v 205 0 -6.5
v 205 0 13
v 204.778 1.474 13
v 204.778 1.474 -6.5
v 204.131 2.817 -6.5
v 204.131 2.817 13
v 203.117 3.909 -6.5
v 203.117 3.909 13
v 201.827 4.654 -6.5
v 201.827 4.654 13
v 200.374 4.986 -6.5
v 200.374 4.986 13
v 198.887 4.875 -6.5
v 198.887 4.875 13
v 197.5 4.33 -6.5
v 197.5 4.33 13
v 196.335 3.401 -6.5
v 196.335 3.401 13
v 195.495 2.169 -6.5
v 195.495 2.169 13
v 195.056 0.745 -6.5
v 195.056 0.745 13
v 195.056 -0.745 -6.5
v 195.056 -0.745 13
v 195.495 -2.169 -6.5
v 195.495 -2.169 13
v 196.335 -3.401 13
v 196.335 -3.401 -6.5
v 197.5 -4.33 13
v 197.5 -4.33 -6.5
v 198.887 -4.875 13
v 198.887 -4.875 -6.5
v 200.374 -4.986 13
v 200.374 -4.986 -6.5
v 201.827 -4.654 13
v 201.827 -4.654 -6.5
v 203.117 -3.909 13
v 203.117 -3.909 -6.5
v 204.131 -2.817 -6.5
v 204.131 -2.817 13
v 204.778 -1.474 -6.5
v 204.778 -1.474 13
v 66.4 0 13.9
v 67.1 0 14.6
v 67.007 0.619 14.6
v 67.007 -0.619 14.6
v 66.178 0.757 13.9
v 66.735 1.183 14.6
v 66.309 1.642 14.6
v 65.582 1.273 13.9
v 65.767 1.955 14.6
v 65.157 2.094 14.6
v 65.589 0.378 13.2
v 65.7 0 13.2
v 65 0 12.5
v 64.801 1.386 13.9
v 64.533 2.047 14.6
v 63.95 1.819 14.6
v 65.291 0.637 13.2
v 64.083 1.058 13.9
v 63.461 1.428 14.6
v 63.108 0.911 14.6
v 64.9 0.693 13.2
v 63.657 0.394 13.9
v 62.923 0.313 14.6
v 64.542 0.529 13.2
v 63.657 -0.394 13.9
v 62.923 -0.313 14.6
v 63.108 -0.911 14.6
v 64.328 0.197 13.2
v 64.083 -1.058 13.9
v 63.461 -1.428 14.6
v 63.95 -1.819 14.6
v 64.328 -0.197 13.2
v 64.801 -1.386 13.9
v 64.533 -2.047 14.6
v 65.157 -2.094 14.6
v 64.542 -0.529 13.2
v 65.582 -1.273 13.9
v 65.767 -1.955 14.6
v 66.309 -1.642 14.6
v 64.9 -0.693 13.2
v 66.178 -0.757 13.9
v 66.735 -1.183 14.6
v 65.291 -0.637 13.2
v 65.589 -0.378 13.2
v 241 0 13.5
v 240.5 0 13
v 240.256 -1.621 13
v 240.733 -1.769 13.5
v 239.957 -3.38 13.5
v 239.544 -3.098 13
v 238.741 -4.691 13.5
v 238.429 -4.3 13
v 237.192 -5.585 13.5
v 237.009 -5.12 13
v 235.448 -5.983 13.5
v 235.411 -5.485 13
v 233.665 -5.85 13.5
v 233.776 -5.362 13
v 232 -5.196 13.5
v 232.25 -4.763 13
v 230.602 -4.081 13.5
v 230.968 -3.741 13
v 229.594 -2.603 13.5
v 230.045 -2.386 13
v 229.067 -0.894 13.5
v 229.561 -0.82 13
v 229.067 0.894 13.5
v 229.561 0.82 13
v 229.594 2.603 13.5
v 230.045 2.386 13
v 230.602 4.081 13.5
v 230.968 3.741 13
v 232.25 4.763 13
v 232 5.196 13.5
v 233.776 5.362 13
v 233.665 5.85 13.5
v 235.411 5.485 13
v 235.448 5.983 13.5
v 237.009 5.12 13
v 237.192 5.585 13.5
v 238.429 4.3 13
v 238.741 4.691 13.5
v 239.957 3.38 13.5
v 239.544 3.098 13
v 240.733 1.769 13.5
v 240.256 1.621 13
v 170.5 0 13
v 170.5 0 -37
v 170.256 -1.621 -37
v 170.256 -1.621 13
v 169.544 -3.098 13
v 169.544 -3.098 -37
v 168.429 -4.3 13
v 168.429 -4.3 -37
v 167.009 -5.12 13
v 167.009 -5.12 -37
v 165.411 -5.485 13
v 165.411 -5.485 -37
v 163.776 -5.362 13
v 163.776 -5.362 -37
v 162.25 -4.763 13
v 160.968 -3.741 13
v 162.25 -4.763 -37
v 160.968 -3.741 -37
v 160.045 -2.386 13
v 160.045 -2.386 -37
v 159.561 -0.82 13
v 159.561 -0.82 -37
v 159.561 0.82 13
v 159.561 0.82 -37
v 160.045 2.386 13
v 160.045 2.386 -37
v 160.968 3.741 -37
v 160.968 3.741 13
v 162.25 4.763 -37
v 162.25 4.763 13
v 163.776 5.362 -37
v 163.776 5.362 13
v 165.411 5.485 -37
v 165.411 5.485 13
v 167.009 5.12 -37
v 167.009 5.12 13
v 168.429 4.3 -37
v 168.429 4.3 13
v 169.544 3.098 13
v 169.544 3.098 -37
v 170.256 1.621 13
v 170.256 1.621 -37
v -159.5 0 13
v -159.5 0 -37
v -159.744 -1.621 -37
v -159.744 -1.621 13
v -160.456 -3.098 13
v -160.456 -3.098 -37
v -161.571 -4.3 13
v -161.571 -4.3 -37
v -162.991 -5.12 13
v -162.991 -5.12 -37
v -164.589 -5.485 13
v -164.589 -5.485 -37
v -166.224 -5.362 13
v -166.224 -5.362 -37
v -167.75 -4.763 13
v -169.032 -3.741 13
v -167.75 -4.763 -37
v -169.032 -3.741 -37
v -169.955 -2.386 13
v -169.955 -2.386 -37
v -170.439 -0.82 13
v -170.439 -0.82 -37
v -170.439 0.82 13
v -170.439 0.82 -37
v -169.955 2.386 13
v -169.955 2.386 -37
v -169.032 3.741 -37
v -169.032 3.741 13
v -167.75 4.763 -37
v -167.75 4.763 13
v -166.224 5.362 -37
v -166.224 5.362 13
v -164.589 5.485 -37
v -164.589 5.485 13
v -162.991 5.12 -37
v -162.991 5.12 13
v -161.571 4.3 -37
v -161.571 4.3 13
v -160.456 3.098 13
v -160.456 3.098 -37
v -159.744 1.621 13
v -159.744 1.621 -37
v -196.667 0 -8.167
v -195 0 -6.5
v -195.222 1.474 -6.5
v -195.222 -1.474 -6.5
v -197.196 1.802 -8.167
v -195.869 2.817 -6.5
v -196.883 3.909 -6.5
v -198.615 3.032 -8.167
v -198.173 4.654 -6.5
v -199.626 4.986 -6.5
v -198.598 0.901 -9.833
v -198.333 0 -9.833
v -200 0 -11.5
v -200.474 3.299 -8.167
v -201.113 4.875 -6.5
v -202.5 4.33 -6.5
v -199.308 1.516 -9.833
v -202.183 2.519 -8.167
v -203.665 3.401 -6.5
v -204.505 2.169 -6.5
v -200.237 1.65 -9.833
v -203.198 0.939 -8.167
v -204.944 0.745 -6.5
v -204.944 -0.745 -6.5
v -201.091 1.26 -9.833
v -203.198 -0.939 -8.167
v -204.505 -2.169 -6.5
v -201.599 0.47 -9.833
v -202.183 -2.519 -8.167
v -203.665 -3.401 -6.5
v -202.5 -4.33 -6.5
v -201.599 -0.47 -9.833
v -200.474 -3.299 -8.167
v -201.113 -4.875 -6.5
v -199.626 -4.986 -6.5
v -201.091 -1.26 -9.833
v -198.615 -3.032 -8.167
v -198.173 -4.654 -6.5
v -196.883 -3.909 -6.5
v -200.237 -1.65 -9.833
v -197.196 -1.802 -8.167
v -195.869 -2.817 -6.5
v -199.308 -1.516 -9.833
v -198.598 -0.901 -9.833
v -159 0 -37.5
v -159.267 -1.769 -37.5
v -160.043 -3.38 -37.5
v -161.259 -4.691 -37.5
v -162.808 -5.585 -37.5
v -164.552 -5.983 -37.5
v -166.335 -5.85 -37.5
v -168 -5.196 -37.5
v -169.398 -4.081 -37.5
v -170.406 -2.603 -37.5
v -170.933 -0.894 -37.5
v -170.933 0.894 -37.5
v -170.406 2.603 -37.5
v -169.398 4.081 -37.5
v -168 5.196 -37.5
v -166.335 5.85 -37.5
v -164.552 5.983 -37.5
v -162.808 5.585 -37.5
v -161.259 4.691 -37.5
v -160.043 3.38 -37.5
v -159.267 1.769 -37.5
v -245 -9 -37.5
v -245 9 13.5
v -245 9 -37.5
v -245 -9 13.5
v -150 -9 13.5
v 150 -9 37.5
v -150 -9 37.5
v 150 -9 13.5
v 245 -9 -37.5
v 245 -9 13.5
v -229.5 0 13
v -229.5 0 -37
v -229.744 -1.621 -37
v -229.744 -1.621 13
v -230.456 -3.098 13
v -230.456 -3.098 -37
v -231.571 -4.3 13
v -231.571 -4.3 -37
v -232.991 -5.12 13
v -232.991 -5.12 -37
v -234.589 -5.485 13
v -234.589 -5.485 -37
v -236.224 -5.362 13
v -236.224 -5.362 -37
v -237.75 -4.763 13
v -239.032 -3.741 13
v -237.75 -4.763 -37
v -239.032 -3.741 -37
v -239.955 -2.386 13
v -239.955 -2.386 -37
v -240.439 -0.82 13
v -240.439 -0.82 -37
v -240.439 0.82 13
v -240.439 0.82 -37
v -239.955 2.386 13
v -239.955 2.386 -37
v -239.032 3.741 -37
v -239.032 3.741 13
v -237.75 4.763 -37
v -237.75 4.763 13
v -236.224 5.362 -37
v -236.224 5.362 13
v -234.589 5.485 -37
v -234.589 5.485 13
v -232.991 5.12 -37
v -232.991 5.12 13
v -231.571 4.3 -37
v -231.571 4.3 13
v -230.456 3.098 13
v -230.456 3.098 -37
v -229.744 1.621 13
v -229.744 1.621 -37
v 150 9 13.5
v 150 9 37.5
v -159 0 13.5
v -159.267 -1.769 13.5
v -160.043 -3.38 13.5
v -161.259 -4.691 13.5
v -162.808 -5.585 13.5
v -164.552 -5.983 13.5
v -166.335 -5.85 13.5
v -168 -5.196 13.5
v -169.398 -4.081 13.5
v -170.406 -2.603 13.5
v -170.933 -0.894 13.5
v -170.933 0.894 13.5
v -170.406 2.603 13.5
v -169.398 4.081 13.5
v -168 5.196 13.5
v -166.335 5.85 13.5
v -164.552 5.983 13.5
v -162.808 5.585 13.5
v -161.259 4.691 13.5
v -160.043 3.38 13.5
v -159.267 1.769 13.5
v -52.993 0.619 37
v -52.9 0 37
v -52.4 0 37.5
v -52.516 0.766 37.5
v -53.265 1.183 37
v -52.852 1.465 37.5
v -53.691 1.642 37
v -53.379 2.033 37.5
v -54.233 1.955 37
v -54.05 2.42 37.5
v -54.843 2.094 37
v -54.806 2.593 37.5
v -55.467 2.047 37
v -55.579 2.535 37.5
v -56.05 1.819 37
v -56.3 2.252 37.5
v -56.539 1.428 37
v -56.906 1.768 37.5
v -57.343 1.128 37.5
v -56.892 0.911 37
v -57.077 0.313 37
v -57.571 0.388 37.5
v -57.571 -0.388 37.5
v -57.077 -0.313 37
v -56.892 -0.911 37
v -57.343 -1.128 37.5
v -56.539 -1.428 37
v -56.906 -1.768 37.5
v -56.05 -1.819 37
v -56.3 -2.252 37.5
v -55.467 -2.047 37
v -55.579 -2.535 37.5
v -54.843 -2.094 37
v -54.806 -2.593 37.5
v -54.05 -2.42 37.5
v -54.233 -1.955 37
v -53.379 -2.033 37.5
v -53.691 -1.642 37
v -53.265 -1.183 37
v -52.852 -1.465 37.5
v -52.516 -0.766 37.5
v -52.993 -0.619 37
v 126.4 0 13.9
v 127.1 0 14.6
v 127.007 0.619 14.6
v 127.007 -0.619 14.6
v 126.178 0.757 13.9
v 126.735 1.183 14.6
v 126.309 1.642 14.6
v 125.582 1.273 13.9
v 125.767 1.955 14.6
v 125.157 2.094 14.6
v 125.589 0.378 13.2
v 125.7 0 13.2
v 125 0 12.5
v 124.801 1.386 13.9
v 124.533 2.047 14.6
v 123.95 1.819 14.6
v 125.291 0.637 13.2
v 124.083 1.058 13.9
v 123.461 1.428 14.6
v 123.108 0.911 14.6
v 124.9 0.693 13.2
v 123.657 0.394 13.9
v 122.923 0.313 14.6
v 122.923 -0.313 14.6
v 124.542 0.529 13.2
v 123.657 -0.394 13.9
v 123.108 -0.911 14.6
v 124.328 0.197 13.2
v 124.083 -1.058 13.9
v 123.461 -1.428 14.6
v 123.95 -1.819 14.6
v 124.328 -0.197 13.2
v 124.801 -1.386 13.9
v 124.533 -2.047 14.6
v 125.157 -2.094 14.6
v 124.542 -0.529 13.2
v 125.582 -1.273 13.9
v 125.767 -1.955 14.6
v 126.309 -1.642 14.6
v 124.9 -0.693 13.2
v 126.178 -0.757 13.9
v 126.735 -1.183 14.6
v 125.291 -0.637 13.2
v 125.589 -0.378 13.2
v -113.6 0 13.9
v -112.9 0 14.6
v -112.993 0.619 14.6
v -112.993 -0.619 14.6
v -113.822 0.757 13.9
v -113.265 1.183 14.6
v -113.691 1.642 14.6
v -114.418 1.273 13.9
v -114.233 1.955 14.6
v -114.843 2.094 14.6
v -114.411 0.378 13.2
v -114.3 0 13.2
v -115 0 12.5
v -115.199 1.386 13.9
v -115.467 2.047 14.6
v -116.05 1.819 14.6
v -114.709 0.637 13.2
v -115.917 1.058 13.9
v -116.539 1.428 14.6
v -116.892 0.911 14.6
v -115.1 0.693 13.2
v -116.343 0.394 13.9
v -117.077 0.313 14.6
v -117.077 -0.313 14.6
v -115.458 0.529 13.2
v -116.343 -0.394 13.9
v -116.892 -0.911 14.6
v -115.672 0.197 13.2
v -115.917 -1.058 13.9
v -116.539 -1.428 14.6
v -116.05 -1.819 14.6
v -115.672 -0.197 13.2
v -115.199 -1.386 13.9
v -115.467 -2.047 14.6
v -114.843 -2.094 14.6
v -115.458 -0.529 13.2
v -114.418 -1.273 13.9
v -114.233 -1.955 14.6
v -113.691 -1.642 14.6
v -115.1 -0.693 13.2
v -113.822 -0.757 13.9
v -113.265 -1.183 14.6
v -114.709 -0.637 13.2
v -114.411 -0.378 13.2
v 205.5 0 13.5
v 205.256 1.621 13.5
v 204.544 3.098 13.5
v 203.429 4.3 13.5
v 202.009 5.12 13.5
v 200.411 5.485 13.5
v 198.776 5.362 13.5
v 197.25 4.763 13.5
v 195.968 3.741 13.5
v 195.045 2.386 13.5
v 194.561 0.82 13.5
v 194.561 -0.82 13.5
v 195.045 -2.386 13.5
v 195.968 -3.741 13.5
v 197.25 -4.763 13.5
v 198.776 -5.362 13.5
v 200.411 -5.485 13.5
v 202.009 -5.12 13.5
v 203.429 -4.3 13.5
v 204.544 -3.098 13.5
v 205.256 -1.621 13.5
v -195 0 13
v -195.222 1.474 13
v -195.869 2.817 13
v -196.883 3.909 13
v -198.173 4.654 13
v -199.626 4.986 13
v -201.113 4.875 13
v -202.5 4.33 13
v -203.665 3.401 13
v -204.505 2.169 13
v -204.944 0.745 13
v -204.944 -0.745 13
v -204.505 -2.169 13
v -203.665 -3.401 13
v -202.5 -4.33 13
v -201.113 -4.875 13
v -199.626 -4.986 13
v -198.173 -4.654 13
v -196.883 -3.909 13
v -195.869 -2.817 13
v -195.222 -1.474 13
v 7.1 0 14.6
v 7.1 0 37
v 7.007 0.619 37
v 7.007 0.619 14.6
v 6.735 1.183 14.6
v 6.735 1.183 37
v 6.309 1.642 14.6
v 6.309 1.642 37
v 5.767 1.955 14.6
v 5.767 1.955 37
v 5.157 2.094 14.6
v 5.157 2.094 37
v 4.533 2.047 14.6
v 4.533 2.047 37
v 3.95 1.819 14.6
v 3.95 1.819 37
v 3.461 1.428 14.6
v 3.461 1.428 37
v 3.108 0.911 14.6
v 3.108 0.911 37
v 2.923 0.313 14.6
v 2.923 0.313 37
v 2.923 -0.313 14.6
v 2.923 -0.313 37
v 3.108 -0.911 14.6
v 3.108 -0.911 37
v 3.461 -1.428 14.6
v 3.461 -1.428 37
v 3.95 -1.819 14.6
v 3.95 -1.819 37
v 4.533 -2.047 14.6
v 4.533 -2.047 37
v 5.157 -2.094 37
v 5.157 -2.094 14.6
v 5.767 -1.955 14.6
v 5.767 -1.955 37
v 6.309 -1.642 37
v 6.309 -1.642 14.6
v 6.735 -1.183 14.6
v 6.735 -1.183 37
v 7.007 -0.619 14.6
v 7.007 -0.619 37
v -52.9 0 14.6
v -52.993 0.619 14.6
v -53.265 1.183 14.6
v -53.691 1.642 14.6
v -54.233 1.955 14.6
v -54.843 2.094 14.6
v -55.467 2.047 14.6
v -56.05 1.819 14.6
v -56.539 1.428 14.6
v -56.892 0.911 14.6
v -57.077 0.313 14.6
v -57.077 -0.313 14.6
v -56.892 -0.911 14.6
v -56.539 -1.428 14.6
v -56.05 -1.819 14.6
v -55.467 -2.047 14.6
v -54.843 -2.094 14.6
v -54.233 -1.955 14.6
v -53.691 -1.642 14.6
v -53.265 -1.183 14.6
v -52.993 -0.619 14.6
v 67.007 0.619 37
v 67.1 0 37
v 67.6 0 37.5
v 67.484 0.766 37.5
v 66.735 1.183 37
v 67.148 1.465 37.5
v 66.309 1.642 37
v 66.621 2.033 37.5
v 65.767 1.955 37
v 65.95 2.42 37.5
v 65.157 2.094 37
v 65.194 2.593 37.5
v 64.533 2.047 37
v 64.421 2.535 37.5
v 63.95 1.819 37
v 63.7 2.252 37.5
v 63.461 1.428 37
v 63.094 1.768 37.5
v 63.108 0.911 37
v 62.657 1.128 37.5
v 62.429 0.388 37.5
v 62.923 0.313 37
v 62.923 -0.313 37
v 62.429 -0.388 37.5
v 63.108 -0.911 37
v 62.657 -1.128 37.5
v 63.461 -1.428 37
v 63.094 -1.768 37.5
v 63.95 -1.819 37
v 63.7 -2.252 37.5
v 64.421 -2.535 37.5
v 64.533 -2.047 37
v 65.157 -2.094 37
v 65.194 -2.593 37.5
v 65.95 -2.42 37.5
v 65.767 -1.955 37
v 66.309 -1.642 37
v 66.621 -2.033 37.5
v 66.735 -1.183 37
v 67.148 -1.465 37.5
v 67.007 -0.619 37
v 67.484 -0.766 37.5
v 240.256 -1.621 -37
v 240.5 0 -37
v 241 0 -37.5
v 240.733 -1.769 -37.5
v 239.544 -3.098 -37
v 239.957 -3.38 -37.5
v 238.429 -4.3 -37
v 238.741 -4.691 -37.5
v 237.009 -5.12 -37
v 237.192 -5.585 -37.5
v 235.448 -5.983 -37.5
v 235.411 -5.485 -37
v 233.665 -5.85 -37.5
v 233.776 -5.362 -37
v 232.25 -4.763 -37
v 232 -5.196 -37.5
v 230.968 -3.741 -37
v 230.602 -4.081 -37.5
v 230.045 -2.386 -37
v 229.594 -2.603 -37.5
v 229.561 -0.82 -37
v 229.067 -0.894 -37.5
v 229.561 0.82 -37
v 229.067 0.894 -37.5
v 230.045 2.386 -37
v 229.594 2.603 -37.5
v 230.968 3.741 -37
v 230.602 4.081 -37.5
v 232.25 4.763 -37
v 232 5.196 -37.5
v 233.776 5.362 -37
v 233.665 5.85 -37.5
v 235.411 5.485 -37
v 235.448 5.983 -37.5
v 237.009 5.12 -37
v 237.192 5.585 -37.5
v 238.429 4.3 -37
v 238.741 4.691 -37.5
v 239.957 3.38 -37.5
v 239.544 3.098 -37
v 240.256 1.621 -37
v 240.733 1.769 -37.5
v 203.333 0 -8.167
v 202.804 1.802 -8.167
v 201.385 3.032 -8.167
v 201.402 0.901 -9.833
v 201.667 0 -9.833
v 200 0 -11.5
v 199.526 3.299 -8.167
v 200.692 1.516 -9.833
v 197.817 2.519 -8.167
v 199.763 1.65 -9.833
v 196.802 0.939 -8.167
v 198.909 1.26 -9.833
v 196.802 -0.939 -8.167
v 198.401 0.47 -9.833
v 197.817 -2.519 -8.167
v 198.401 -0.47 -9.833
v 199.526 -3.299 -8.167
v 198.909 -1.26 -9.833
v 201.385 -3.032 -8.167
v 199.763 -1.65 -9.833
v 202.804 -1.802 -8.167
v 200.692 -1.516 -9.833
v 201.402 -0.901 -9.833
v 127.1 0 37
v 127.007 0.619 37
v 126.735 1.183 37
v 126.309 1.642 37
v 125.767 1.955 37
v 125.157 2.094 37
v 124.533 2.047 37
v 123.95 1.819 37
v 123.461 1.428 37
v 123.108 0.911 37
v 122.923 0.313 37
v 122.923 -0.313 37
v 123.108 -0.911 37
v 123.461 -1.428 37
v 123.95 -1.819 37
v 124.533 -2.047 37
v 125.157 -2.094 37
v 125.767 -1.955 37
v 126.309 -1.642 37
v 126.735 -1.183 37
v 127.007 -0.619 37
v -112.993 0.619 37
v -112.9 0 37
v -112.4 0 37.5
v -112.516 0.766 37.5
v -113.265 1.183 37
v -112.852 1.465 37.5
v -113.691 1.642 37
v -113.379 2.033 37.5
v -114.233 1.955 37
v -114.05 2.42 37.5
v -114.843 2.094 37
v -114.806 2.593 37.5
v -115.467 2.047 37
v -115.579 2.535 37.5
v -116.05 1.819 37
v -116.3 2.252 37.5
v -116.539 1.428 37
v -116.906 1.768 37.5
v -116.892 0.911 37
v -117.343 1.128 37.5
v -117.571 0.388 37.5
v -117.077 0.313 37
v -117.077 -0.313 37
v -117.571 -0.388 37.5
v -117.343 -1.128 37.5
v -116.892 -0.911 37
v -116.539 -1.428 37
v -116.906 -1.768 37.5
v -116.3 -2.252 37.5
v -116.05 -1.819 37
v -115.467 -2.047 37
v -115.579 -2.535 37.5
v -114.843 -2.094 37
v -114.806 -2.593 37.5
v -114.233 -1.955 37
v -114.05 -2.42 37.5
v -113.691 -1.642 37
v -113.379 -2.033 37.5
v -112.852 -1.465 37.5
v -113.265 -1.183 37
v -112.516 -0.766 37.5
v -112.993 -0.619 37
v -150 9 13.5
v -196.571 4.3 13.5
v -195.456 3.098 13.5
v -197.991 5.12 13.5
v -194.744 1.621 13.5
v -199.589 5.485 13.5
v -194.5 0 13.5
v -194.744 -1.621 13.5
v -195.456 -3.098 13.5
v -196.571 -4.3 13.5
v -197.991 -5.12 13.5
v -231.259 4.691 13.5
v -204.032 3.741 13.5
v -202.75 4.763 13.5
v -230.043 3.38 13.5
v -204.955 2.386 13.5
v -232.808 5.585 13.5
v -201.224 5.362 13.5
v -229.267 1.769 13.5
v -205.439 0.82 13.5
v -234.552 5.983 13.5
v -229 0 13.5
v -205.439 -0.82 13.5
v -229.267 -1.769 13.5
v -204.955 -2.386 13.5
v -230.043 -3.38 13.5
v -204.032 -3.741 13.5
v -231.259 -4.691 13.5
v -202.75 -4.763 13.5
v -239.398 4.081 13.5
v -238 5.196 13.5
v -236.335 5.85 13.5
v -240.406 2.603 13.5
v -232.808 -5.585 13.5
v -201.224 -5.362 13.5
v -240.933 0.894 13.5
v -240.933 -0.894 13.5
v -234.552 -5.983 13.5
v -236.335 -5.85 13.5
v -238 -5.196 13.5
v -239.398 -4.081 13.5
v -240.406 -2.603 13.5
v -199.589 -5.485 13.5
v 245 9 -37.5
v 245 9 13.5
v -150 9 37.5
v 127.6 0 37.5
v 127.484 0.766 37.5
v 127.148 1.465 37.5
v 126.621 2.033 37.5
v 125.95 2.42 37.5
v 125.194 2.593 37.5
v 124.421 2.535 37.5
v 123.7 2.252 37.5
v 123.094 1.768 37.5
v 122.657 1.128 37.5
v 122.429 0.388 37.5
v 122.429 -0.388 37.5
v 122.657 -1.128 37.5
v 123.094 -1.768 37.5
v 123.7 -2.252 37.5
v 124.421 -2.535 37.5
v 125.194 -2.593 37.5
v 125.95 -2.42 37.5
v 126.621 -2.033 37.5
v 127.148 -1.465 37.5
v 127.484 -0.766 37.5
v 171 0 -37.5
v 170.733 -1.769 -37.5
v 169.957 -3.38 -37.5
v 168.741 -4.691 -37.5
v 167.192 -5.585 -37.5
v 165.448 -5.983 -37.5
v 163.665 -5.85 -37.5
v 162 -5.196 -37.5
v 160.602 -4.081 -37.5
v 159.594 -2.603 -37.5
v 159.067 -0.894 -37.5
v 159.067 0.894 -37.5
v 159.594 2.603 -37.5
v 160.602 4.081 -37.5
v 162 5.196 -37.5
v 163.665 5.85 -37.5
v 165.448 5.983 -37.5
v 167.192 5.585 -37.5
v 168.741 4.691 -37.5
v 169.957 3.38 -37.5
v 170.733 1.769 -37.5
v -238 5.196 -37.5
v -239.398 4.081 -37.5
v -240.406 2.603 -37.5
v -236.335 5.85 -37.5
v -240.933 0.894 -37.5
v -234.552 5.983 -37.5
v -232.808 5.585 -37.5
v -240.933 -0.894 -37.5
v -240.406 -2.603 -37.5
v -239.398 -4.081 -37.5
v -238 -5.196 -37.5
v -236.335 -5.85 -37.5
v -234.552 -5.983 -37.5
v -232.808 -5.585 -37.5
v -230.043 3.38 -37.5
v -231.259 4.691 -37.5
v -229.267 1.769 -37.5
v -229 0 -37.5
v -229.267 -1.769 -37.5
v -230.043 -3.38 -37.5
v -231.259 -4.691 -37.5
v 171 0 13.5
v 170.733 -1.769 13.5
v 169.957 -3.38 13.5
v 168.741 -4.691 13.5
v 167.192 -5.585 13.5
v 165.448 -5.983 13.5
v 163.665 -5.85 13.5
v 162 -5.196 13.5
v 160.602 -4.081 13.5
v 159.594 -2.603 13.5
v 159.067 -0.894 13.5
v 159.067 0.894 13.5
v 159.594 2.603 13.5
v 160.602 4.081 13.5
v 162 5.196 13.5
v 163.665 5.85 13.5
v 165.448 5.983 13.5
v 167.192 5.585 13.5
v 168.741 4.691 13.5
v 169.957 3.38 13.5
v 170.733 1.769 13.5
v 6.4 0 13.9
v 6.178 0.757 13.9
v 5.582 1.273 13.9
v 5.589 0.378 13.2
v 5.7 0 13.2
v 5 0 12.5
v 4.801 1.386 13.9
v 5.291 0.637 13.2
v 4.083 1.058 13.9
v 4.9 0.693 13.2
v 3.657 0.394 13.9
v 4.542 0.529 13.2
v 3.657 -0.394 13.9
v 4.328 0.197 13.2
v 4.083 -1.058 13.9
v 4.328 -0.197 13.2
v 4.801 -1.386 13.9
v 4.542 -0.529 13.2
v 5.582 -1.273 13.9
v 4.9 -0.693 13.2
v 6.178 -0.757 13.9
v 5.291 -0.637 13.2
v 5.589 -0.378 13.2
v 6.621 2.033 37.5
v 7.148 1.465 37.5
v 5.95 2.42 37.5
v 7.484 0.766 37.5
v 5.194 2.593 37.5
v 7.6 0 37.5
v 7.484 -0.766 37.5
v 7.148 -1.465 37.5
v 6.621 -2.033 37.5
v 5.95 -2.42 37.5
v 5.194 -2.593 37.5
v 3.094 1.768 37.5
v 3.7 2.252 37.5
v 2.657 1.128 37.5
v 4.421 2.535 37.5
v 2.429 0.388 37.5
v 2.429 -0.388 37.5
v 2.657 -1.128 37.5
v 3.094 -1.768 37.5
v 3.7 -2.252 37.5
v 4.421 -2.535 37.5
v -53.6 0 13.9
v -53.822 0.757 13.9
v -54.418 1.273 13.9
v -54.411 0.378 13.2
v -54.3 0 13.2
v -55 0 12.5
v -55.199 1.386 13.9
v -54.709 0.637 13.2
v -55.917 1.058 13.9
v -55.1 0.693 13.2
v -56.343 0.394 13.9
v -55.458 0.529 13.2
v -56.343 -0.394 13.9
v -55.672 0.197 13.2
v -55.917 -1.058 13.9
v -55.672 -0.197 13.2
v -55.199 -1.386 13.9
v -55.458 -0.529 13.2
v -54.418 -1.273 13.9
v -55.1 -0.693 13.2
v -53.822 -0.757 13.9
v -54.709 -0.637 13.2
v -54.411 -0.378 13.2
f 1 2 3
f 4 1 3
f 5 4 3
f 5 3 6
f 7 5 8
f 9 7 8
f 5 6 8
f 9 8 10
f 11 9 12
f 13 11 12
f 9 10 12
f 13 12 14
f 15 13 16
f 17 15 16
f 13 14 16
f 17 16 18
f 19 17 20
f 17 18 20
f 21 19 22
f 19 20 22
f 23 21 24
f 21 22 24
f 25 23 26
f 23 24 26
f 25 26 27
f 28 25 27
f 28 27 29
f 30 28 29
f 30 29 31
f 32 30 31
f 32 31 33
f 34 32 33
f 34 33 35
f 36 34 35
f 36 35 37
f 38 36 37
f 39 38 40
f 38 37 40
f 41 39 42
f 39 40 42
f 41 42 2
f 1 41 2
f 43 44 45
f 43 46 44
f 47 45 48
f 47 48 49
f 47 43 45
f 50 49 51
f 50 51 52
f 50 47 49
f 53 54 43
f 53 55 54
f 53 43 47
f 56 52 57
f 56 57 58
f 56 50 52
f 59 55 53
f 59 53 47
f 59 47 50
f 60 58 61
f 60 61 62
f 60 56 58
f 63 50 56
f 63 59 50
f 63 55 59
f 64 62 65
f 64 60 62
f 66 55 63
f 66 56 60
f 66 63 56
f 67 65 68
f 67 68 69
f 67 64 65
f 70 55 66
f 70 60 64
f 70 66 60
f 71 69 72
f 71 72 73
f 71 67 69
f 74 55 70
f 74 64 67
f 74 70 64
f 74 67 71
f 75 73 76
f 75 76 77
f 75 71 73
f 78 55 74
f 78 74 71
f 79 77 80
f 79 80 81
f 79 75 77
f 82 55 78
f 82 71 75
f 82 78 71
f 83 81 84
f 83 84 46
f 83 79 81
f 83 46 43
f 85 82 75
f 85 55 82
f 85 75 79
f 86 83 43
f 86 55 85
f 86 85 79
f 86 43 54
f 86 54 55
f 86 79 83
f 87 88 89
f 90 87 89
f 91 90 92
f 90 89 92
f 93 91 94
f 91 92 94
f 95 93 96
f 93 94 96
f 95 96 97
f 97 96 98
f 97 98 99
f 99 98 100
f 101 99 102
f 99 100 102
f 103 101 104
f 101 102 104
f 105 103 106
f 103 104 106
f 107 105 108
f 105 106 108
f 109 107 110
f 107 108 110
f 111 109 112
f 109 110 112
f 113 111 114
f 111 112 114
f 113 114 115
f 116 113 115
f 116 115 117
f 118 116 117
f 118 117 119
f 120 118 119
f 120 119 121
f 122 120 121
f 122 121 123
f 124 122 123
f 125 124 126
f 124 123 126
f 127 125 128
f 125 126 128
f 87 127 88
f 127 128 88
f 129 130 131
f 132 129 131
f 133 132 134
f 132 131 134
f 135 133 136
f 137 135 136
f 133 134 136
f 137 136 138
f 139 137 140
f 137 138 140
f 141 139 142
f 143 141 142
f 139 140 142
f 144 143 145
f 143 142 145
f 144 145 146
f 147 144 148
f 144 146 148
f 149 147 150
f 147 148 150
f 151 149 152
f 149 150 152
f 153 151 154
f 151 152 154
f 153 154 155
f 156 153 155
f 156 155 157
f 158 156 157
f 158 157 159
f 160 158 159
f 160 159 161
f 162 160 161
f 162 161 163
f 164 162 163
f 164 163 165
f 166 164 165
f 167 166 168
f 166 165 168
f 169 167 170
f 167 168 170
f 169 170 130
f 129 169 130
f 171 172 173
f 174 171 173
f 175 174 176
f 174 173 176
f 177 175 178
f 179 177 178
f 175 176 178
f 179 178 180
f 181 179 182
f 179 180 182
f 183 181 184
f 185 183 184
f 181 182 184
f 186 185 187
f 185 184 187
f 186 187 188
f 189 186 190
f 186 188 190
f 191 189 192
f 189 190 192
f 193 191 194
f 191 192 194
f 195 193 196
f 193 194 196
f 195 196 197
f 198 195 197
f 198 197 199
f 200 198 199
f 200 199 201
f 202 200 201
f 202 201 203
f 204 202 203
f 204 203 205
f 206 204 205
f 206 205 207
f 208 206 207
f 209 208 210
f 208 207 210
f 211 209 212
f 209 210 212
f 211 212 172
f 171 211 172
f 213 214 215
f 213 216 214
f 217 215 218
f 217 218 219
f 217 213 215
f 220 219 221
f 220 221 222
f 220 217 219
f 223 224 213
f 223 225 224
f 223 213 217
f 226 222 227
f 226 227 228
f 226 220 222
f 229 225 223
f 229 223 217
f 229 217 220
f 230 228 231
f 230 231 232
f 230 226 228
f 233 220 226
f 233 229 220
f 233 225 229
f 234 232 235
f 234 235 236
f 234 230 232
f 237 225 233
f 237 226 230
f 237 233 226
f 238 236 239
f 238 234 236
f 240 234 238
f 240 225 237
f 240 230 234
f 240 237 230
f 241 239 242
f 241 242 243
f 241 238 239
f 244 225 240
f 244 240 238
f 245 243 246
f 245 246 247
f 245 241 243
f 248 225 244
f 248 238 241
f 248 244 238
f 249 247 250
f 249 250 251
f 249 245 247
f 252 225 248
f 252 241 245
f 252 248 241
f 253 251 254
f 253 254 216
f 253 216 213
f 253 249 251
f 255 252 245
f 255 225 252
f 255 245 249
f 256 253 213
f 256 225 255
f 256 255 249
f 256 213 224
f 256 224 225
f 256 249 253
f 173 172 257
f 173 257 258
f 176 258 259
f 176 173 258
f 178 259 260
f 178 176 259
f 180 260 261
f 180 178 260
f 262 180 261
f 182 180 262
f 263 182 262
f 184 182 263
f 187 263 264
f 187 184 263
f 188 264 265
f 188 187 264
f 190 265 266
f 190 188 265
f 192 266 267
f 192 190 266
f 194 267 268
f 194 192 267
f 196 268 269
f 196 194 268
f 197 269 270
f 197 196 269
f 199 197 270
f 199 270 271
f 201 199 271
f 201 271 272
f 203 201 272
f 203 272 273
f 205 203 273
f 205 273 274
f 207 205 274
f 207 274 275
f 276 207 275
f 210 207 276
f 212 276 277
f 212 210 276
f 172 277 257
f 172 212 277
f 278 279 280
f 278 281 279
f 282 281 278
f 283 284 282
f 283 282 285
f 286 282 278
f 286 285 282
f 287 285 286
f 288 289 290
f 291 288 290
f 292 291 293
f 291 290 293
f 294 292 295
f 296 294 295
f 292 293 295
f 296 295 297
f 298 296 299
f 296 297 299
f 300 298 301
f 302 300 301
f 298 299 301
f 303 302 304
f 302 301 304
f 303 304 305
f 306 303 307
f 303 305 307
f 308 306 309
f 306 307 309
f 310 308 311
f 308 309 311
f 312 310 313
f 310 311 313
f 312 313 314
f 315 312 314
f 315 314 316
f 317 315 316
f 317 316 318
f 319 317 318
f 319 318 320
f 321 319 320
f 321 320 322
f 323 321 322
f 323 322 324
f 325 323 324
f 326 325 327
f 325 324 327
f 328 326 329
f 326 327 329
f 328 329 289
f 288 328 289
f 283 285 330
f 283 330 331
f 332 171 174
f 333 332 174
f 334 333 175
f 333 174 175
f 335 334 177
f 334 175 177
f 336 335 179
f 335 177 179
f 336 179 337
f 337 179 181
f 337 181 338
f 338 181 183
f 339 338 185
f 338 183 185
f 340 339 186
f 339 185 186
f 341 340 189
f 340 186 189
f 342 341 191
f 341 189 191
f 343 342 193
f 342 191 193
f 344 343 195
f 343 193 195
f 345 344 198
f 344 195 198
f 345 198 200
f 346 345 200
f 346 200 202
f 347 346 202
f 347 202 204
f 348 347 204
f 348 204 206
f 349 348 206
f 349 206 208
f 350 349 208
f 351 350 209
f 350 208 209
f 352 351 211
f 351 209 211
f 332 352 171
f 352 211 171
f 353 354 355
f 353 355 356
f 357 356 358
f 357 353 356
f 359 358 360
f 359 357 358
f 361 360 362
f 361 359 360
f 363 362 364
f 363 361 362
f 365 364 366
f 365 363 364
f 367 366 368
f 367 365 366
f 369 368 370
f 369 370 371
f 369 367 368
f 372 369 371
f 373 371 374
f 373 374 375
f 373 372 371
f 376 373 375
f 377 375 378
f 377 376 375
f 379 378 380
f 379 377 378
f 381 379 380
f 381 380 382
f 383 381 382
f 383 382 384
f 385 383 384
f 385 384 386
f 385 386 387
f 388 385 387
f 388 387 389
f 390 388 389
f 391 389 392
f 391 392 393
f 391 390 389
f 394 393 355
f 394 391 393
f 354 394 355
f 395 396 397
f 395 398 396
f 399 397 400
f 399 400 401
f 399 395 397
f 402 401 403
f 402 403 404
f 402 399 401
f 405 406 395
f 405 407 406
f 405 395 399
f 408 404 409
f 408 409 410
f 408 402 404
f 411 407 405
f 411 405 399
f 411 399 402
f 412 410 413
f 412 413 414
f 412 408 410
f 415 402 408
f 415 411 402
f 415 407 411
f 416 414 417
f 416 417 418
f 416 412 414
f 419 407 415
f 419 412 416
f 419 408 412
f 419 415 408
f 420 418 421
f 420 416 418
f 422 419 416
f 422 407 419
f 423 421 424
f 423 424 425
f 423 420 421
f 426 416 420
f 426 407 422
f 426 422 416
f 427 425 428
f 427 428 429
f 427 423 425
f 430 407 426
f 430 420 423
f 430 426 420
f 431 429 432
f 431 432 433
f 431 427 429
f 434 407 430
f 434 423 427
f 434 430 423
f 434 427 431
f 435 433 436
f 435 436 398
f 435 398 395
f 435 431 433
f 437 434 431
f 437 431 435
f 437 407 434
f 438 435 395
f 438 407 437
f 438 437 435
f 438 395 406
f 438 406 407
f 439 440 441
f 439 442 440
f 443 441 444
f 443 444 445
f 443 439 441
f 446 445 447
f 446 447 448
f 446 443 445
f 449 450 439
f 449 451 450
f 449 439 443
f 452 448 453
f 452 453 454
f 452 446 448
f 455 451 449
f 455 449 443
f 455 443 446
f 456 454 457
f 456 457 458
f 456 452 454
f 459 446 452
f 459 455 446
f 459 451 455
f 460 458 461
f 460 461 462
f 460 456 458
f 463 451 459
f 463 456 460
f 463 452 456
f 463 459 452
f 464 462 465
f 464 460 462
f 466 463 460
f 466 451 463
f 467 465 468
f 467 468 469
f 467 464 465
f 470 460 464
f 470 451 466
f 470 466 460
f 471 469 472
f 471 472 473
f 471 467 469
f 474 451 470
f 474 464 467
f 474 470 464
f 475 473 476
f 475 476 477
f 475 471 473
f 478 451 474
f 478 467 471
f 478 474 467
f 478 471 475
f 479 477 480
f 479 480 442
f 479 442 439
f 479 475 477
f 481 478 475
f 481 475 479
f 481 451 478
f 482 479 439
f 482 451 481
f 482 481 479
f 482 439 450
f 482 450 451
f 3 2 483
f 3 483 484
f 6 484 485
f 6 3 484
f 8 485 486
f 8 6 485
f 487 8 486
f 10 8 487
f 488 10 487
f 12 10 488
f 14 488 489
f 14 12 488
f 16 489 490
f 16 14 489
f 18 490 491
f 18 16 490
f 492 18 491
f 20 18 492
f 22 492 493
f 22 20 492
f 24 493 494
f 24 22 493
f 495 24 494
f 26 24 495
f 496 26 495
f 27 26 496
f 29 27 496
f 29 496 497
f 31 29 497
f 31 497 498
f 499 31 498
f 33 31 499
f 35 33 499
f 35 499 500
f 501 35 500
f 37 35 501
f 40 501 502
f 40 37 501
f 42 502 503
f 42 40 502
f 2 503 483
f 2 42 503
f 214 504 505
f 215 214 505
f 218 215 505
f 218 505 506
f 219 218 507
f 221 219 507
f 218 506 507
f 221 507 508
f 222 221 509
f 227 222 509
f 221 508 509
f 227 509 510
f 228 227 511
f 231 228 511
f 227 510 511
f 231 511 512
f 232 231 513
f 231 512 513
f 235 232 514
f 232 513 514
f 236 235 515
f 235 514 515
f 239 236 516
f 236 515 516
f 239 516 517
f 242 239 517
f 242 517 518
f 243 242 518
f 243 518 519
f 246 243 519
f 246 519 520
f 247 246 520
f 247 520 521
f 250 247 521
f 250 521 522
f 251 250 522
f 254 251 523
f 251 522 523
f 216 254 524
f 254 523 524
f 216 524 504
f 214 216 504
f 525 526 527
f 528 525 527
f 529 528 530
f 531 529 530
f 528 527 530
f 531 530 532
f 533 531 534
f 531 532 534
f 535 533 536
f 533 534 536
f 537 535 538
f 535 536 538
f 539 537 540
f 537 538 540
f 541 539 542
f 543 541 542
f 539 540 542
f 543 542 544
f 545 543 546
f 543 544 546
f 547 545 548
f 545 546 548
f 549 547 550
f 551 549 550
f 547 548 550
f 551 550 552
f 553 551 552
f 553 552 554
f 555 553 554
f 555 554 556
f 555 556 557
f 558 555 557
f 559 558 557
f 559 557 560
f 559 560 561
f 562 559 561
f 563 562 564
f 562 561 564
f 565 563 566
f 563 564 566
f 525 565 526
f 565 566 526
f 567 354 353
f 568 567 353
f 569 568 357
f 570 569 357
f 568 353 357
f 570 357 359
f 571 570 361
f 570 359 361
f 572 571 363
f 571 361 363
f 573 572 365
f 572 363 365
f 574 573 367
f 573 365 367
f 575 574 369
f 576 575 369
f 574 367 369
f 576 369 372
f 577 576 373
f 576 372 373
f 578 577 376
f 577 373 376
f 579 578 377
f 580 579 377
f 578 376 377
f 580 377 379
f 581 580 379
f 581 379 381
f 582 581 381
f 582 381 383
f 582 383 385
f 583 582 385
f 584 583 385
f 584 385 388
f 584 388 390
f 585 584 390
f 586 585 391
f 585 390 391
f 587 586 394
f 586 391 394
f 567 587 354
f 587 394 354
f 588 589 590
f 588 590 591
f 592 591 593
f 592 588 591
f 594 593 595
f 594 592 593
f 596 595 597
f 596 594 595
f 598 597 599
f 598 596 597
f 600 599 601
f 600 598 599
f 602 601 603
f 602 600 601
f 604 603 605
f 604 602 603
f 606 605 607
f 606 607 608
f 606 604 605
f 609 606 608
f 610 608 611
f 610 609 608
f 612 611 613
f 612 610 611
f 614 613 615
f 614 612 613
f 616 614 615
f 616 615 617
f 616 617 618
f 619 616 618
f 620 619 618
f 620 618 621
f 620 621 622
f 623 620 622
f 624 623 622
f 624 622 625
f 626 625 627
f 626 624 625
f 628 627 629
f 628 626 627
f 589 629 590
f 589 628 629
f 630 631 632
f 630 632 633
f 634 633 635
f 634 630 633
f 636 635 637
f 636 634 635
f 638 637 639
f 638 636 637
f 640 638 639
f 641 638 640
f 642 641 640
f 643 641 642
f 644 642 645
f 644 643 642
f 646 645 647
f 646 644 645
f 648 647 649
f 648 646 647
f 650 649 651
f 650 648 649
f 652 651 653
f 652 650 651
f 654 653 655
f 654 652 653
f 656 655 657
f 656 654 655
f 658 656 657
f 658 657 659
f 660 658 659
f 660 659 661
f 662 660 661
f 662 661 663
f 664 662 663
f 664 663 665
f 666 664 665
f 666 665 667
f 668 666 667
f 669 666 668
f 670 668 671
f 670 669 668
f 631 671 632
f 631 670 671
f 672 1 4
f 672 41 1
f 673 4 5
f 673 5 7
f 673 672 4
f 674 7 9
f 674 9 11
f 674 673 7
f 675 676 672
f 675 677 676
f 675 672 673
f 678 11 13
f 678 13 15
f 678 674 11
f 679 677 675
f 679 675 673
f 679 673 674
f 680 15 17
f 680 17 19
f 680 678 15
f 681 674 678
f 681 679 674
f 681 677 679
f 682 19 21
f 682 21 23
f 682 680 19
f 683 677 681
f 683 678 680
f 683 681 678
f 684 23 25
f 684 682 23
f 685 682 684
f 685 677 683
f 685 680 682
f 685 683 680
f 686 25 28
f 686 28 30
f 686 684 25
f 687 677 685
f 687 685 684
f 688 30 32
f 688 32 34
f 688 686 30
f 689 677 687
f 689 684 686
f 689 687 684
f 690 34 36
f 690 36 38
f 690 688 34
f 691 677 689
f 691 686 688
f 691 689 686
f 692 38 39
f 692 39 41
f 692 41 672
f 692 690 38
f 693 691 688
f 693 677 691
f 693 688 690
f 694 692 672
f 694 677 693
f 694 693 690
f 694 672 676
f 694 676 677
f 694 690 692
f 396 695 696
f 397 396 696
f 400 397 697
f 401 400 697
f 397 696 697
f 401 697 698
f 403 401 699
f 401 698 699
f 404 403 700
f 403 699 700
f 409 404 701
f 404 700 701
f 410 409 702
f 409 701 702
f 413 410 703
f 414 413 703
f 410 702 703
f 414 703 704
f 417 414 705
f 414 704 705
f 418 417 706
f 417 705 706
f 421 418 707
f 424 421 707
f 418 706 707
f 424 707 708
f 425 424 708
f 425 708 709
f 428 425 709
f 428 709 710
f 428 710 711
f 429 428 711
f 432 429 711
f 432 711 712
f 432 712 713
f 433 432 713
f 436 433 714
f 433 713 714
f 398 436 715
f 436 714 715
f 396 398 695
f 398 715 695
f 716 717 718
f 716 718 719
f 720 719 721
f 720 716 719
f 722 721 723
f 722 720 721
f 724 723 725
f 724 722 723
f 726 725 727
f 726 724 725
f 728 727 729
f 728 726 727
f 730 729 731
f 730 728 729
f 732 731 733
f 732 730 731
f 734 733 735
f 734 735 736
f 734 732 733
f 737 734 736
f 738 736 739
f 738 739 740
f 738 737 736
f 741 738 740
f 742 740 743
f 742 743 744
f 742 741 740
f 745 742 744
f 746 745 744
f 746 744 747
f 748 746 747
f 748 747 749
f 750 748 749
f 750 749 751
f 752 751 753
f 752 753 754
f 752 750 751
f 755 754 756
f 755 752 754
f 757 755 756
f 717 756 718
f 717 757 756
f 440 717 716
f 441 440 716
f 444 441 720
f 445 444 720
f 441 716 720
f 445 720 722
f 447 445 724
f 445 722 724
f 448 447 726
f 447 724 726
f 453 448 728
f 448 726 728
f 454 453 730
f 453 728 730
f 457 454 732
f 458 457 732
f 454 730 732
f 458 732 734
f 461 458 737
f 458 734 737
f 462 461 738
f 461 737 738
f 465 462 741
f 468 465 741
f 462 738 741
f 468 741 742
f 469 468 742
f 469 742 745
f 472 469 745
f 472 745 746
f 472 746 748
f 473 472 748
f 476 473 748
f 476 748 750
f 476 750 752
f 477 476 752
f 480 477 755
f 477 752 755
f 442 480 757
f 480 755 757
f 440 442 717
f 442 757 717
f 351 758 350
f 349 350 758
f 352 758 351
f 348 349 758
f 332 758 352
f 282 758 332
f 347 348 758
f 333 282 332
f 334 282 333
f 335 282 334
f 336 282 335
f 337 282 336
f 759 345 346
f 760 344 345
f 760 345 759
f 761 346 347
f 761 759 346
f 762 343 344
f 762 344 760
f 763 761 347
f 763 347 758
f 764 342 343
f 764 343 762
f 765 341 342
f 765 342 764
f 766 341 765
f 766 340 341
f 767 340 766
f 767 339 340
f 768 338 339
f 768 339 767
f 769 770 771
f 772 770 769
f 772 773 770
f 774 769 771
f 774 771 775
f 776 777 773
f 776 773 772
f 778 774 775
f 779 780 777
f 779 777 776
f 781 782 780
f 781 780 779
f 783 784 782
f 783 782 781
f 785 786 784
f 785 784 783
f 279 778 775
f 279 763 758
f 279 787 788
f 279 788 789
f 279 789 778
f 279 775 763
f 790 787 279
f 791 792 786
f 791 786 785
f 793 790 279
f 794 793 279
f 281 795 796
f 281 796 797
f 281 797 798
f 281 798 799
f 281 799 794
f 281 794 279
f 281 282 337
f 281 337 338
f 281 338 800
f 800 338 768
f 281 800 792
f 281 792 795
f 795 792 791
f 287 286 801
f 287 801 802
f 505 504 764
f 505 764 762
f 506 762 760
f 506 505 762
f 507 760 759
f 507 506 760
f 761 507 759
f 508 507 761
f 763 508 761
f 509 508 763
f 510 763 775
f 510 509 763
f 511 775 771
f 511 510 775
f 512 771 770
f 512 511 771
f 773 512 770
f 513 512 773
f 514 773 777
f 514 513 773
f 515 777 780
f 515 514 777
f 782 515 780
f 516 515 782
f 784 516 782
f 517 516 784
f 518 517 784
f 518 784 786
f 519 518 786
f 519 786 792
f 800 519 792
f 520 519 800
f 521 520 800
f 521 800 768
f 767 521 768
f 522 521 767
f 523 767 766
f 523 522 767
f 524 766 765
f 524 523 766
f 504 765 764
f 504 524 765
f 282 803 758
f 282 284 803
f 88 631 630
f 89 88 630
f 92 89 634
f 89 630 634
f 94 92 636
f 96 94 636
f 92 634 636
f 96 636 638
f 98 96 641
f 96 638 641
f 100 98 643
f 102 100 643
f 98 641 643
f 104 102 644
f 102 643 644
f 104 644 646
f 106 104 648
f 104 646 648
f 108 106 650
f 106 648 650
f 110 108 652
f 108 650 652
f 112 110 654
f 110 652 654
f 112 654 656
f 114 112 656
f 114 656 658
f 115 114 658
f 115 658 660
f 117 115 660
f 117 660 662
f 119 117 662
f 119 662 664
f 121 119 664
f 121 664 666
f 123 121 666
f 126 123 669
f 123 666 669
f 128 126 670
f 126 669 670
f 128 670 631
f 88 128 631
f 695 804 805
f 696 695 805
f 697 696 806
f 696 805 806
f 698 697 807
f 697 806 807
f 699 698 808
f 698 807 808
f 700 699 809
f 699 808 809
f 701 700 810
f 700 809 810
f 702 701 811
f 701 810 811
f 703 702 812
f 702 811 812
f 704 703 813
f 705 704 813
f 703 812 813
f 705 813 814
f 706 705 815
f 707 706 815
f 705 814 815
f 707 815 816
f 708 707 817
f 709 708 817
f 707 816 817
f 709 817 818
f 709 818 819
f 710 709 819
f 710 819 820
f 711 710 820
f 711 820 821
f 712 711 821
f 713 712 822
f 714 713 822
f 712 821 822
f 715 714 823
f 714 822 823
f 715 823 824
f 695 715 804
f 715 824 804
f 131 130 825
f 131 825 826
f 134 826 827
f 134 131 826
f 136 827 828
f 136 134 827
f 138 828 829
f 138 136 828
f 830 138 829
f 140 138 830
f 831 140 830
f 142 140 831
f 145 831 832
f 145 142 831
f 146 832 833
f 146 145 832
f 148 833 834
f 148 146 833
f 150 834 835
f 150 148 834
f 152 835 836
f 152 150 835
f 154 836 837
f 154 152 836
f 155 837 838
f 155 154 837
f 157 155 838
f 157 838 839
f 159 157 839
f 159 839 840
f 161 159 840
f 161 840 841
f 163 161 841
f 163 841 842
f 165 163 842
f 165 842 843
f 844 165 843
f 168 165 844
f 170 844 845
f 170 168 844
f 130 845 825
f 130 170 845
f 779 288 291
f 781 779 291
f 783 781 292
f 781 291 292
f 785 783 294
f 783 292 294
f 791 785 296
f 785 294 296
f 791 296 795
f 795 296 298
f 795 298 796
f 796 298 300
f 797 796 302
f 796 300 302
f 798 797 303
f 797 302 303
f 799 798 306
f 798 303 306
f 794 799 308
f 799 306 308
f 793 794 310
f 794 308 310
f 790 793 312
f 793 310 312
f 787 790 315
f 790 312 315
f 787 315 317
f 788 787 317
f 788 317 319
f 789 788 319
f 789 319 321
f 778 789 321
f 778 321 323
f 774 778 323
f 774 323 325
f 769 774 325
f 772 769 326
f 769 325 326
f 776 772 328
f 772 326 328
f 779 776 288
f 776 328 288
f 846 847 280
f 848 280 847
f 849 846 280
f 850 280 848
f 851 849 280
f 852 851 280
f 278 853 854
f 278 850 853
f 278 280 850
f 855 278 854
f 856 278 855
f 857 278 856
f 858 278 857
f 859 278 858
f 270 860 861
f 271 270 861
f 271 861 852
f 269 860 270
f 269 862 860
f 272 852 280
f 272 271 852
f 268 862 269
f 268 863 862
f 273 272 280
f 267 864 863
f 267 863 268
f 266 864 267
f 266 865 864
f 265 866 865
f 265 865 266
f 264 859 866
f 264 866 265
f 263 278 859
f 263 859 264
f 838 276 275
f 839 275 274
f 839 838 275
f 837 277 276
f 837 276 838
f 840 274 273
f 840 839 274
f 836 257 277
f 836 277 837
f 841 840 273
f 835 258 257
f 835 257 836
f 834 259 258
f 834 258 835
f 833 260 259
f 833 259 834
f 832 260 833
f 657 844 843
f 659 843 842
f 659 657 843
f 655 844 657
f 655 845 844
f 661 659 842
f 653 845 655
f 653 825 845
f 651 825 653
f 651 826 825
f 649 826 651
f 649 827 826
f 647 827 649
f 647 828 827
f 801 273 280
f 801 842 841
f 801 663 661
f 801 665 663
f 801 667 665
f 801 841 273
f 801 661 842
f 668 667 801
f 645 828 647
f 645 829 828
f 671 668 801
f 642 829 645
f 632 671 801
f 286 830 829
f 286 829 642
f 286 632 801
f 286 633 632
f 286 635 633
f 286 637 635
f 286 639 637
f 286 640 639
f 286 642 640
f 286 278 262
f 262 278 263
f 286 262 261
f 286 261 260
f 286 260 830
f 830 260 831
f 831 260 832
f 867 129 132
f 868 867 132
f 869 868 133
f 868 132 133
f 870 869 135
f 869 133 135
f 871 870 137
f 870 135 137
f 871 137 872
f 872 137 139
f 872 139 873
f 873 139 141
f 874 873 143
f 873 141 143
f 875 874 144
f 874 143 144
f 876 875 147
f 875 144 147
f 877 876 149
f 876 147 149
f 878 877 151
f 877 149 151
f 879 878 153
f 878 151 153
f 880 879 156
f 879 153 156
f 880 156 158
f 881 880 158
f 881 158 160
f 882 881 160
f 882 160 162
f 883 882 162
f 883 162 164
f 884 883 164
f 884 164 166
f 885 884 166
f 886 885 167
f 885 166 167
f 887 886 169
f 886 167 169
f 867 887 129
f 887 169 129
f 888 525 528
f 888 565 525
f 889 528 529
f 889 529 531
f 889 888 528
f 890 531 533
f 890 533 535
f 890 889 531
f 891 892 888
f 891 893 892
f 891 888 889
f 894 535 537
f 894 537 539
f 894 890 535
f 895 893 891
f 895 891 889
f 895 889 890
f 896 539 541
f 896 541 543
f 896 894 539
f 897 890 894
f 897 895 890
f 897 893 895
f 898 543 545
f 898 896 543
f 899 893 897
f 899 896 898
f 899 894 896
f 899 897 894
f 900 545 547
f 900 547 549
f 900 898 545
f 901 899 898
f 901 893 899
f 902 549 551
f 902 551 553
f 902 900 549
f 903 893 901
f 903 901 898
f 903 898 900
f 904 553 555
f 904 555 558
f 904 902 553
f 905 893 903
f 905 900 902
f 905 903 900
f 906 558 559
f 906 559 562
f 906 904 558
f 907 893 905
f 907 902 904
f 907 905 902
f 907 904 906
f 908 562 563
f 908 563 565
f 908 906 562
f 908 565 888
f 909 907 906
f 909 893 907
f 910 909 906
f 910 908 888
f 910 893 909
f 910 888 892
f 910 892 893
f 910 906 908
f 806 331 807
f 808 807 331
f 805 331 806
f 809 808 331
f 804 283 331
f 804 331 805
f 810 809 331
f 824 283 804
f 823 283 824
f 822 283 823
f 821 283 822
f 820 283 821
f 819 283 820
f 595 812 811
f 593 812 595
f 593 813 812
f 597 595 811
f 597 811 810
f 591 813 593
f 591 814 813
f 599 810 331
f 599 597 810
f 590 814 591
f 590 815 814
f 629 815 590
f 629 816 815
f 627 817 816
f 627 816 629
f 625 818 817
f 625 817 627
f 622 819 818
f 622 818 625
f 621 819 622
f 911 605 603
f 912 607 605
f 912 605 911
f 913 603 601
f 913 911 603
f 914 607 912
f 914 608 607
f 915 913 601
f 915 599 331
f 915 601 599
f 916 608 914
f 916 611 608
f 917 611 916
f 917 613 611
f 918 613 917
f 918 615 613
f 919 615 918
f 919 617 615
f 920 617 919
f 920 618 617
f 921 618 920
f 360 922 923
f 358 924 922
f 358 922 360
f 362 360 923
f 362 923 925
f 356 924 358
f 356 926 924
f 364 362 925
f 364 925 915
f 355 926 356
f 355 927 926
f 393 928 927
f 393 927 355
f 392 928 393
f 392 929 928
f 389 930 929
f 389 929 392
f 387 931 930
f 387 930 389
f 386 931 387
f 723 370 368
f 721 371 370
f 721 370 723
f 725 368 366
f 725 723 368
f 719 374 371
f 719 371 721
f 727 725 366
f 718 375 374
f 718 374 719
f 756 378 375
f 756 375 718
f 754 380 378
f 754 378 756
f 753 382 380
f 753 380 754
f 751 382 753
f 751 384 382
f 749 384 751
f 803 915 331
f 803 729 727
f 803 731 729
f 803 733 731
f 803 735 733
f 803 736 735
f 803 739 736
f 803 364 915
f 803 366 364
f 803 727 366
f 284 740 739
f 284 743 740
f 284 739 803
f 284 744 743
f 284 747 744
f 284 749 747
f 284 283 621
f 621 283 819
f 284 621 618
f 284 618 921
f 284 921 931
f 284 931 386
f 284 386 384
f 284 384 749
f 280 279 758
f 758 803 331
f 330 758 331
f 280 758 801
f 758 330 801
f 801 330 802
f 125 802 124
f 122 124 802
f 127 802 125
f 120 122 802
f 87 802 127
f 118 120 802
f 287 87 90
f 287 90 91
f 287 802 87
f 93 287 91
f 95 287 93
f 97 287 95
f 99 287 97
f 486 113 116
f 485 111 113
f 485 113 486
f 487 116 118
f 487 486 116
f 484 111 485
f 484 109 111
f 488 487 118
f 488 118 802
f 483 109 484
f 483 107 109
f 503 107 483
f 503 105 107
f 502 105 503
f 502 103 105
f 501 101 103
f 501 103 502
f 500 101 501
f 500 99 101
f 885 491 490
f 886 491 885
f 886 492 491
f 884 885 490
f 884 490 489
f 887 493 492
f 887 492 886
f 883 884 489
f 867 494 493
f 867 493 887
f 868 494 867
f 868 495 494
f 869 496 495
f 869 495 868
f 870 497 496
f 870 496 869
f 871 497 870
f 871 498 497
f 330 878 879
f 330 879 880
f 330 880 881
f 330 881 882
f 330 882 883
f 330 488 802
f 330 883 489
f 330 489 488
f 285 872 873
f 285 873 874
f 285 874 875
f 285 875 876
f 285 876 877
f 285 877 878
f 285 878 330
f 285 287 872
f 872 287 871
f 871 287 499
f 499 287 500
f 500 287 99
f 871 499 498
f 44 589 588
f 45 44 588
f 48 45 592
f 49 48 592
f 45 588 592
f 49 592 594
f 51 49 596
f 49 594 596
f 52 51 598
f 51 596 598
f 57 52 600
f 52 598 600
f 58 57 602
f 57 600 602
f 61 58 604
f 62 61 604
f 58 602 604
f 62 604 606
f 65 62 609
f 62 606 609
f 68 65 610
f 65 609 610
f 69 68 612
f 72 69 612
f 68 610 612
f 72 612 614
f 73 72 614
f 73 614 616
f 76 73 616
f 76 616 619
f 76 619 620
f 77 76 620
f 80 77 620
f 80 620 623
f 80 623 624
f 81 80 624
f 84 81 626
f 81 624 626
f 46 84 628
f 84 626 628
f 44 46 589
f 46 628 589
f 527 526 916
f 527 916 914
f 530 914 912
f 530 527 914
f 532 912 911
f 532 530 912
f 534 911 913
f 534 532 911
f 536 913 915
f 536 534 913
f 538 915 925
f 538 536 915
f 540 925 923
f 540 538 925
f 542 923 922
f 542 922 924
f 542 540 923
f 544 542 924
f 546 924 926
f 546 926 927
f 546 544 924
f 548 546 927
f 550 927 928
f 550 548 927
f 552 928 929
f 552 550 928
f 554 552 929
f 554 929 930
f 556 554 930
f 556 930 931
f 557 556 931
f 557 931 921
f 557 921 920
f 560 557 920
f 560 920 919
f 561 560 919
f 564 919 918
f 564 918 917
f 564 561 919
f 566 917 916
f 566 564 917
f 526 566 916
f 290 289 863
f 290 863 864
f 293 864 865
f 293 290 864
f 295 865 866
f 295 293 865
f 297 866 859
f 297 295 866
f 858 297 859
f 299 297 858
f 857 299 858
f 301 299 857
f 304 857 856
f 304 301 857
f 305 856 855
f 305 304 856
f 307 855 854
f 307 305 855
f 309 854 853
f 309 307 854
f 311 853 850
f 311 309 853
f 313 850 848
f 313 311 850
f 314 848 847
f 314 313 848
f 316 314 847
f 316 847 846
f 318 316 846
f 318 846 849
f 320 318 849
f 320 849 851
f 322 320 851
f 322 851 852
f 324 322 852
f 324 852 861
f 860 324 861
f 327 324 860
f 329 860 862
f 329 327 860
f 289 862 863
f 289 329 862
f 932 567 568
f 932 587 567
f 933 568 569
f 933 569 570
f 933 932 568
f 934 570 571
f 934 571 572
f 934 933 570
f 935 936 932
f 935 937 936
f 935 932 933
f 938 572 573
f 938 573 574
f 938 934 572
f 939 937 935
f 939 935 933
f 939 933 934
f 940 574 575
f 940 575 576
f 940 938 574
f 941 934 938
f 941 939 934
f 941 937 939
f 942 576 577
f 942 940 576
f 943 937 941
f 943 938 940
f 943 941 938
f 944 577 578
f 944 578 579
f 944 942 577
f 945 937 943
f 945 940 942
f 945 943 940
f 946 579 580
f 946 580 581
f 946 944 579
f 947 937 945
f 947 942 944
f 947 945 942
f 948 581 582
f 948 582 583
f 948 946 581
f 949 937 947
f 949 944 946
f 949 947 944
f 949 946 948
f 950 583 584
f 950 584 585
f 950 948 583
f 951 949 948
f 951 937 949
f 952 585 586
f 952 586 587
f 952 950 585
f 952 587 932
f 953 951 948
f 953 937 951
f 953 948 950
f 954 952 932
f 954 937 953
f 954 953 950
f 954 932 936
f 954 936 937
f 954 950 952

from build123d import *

# Parameters (mm, degrees)
F1_DEPTH = 9
F2_R     = 5.5
F3_DEPTH = 51
F4_R     = 2.1
F5_DEPTH = 25
F6_R     = 5
F7_DEPTH = 25
F8_SIZE  = 5
F9_SIZE  = 2.1
F10_SIZE = 0.5


with BuildPart() as f1:
    # F0 (on Front) → F1 (new body, symmetric)
    with BuildSketch(Plane.XZ):
        Polygon((-245, 13.5), (-245, -37.5), (245, -37.5), (245, 13.5), (150, 13.5), (150, 37.5), (-150, 37.5), (-150, 13.5), align=None)
    extrude(amount=F1_DEPTH, both=True)

    # F2 (on face) → F3 (cut, through all)
    with BuildSketch(Plane(origin=(0, 0, -37.5), x_dir=(1, 0, 0), z_dir=(0, 0, -1))):
        with Locations((235, 0)):
            Circle(F2_R)
        with Locations((165, 0)):
            Circle(F2_R)
        with Locations((-165, 0)):
            Circle(F2_R)
        with Locations((-235, 0)):
            Circle(F2_R)
    extrude(amount=-F3_DEPTH, mode=Mode.SUBTRACT)

    # F4 (on face) → F5 (cut)
    with BuildSketch(Plane.XY.offset(37.5)):
        with Locations((-115, 0)):
            Circle(F4_R)
        with Locations((-55, 0)):
            Circle(F4_R)
        with Locations((5, 0)):
            Circle(F4_R)
        with Locations((65, 0)):
            Circle(F4_R)
        with Locations((125, 0)):
            Circle(F4_R)
    extrude(amount=-F5_DEPTH, mode=Mode.SUBTRACT)

    # F6 (on face) → F7 (cut)
    with BuildSketch(Plane.XY.offset(13.5)):
        with Locations((-200, 0)):
            Circle(F6_R)
        with Locations((200, 0)):
            Circle(F6_R)
    extrude(amount=-F7_DEPTH, mode=Mode.SUBTRACT)

    # F8
    f8_edges = [f1.edges().sort_by_distance(p)[0] for p in [
        (-205, 0, -11.5),
        (195, 0, -11.5),
    ]]
    chamfer(f8_edges, length=F8_SIZE)

    # F9
    f9_edges = [f1.edges().sort_by_distance(p)[0] for p in [
        (122.9, 0, 12.5),
        (62.9, 0, 12.5),
        (2.9, 0, 12.5),
        (-57.1, 0, 12.5),
        (-117.1, 0, 12.5),
    ]]
    chamfer(f9_edges, length=F9_SIZE)

    # F10
    f10_edges = [f1.edges().sort_by_distance(p)[0] for p in [
        (-159.5, 0, -12),
        (-170.5, 0, -37.5),
        (-170.5, 0, 13.5),
        (-229.5, 0, -12),
        (-240.5, 0, -37.5),
        (-240.5, 0, 13.5),
        (-205, 0, 13.5),
        (-117.1, 0, 37.5),
        (-57.1, 0, 37.5),
        (2.9, 0, 37.5),
        (62.9, 0, 37.5),
        (122.9, 0, 37.5),
        (170.5, 0, -12),
        (159.5, 0, -37.5),
        (159.5, 0, 13.5),
        (240.5, 0, -12),
        (229.5, 0, -37.5),
        (229.5, 0, 13.5),
        (195, 0, 13.5),
    ]]
    chamfer(f10_edges, length=F10_SIZE)


solid = f1.part
